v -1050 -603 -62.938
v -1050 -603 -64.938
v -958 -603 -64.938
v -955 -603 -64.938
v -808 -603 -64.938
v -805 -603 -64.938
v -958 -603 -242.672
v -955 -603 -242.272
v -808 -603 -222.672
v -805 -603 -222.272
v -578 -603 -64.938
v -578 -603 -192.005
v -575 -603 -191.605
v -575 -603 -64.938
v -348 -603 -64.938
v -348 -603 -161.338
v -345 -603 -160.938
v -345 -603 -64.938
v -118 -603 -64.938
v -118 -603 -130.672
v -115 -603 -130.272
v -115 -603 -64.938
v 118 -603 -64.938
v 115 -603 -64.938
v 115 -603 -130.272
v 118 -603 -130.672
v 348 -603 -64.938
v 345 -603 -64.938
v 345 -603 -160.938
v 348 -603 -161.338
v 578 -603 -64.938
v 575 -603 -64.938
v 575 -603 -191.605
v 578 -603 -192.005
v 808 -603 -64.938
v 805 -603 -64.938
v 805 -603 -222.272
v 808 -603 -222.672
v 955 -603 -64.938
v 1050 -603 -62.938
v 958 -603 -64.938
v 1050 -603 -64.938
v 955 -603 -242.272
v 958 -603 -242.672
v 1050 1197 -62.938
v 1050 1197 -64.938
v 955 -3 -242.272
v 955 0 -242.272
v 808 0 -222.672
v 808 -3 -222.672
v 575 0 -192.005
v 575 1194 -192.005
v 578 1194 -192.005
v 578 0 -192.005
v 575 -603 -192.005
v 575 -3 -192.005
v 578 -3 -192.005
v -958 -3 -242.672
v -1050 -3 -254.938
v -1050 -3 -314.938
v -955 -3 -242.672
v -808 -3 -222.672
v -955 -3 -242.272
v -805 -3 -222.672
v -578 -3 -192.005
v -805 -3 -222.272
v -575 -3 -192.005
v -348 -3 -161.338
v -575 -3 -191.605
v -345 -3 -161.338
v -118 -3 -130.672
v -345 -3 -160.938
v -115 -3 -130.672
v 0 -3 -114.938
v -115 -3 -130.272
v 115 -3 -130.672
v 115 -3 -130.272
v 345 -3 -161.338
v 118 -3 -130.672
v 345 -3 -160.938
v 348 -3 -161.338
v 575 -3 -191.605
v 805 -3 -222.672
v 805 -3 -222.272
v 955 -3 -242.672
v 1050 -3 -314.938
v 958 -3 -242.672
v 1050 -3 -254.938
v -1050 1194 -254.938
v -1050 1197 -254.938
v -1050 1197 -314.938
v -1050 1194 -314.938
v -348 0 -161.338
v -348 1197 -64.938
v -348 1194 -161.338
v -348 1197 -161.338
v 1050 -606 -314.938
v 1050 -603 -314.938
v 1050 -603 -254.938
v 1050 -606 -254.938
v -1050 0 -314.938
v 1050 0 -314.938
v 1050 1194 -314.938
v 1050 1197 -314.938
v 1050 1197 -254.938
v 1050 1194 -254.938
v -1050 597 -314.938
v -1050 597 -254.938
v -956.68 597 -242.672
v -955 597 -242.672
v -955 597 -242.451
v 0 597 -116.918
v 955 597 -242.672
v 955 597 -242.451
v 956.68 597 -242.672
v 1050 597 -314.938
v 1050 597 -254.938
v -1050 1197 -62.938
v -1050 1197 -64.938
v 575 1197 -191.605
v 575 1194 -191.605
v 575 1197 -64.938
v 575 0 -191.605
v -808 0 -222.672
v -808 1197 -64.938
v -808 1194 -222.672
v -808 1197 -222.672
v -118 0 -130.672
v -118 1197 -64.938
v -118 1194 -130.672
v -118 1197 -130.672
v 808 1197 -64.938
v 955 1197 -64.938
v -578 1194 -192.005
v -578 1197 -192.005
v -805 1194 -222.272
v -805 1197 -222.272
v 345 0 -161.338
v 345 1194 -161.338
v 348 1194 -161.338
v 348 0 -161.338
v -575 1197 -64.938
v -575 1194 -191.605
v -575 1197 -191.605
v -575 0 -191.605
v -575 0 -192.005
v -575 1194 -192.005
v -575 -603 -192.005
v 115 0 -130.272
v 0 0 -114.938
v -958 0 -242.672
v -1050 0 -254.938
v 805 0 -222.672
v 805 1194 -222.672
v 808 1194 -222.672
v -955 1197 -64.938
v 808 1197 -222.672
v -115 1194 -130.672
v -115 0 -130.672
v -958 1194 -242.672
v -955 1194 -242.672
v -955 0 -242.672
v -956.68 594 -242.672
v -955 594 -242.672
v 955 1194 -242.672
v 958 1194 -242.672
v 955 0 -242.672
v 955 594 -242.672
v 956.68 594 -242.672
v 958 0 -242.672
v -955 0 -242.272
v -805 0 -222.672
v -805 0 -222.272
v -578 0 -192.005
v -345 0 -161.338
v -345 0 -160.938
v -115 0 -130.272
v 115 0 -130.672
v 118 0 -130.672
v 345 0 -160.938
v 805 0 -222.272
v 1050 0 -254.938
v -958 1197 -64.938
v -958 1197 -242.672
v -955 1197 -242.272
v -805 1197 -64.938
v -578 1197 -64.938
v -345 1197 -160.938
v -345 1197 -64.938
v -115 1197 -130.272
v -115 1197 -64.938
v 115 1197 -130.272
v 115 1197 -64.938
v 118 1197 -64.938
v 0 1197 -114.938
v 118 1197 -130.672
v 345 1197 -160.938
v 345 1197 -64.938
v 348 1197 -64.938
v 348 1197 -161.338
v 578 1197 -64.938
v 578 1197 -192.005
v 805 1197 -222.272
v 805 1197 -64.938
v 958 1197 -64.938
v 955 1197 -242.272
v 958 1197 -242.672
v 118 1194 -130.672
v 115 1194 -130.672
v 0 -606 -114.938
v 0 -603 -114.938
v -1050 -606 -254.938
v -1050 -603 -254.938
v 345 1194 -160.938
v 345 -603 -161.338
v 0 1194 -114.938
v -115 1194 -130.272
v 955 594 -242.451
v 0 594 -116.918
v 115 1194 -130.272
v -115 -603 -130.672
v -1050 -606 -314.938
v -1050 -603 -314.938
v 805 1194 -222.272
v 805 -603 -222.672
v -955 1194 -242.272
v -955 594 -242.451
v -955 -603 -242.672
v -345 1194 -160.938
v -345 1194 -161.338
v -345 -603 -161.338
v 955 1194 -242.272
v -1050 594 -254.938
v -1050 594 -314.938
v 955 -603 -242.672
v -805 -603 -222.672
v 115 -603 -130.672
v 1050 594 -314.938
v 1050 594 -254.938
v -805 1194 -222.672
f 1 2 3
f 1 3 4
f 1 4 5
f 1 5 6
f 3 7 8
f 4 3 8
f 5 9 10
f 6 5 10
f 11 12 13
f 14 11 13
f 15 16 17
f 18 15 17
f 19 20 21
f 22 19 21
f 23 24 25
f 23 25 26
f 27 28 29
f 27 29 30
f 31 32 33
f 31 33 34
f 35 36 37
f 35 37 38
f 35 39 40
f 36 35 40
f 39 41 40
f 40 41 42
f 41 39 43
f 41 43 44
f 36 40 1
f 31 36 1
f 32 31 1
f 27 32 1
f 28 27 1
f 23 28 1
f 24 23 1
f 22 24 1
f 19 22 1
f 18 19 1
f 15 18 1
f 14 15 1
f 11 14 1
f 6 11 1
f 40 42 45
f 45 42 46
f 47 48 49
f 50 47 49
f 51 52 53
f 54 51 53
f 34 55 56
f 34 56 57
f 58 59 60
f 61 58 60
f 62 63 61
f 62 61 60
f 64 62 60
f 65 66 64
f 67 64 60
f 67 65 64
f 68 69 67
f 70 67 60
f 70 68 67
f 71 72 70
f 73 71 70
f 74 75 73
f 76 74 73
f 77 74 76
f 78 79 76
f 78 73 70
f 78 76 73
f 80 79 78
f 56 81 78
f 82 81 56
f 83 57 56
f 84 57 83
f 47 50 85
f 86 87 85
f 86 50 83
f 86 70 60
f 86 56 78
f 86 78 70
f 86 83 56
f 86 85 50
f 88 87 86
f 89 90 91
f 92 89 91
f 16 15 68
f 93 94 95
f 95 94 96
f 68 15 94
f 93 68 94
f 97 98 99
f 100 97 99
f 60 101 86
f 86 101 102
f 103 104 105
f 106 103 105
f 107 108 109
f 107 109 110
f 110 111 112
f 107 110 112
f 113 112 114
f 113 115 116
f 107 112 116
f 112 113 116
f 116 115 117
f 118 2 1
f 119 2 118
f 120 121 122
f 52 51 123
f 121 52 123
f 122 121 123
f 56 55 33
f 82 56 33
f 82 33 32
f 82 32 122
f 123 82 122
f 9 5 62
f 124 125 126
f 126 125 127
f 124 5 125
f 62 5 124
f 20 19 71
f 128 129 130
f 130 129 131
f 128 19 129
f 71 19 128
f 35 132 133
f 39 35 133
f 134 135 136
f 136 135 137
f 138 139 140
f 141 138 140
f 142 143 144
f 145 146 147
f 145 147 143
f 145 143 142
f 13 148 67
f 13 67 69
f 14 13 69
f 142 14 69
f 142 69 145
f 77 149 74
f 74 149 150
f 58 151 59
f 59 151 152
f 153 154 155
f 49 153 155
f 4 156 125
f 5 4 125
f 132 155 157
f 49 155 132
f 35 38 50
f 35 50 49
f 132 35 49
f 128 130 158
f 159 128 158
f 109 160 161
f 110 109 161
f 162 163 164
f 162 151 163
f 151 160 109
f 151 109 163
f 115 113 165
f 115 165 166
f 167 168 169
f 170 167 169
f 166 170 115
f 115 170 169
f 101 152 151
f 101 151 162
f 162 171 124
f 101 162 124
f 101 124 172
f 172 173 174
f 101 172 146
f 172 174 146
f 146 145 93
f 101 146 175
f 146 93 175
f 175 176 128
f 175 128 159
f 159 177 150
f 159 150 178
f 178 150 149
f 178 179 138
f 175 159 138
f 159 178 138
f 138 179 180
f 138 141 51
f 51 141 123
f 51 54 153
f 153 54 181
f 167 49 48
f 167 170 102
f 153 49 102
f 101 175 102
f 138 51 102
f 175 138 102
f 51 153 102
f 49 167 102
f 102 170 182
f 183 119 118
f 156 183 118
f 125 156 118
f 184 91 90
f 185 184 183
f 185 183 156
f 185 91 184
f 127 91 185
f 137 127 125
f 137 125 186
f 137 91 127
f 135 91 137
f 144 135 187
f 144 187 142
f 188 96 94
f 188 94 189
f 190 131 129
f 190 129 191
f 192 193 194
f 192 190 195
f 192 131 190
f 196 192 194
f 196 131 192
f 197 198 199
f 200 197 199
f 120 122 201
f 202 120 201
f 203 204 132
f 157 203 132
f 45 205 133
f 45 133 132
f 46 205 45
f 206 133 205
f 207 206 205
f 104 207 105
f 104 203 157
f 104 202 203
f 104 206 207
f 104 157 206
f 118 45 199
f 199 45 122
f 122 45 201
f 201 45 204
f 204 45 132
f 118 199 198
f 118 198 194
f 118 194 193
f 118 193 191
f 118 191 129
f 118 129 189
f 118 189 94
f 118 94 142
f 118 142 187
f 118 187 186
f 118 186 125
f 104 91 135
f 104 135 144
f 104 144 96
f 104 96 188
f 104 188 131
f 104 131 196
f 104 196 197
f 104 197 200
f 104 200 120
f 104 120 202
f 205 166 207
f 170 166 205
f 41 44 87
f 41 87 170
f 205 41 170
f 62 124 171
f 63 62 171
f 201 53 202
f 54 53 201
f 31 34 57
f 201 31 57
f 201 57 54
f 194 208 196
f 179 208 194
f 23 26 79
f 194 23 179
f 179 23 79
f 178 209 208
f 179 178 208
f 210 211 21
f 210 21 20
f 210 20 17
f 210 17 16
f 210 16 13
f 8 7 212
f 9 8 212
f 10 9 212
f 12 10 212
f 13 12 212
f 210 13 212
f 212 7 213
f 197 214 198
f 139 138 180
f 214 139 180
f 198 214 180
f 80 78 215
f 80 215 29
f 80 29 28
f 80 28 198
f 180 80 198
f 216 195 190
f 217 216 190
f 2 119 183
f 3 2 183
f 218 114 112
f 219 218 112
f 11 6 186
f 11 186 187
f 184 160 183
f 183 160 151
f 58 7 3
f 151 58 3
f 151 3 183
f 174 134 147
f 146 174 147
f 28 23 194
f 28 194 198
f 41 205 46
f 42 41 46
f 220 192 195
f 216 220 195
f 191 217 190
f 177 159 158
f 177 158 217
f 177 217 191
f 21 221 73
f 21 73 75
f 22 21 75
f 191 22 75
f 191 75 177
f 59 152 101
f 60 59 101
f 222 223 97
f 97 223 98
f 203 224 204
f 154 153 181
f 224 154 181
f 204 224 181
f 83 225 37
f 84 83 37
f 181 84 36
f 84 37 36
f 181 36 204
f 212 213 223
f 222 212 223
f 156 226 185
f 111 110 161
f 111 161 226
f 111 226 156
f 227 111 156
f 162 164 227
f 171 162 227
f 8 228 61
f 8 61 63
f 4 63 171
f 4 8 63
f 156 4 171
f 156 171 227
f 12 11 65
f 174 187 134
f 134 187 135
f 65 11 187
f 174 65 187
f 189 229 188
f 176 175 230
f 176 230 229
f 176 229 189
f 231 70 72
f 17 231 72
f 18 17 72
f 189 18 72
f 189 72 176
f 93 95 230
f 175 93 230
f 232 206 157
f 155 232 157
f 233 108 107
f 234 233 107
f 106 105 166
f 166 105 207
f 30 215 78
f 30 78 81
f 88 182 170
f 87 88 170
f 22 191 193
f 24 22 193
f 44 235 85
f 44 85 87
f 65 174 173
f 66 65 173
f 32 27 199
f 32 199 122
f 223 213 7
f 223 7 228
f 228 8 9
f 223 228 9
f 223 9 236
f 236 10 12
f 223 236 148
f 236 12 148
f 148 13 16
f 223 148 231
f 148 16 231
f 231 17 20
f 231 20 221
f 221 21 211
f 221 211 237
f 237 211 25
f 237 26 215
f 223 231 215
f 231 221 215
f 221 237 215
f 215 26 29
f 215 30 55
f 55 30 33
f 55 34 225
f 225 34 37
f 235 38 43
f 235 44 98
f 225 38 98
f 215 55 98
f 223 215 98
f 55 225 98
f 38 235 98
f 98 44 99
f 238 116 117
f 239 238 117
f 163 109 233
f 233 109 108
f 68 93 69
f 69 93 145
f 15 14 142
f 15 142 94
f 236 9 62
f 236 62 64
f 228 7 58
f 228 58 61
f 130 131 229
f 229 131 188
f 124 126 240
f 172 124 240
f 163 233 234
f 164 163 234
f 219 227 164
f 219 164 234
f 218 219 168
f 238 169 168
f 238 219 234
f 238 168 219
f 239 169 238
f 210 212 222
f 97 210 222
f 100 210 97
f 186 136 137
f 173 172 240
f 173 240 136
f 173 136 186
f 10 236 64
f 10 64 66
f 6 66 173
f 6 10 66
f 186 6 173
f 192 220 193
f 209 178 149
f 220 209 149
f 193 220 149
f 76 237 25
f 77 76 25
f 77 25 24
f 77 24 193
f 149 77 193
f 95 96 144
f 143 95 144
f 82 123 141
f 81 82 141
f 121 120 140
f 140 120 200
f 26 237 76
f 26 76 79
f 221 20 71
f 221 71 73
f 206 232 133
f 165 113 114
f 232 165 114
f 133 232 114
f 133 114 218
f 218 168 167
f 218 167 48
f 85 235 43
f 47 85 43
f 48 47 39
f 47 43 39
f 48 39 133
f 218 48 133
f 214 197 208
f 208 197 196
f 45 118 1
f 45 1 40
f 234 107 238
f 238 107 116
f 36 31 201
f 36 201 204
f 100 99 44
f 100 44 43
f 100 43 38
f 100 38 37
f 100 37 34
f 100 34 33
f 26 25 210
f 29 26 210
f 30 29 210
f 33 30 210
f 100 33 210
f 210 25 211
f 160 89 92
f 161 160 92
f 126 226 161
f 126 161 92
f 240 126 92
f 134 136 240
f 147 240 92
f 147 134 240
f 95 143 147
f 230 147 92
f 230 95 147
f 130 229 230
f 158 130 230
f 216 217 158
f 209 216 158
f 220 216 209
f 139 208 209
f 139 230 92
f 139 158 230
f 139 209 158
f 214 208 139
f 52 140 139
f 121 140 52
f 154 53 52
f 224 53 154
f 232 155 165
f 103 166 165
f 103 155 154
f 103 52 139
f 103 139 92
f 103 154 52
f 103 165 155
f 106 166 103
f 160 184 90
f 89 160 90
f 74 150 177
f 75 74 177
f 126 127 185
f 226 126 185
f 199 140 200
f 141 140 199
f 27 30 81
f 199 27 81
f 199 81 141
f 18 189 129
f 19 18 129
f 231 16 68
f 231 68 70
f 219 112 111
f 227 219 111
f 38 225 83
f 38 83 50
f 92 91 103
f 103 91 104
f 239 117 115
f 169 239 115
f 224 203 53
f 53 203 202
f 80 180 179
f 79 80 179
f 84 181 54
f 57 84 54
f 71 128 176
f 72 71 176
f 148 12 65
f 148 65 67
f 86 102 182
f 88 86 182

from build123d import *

# Parameters (mm, degrees)
F1_DEPTH  = 3
F3_W      = 3
F3_H      = 177.7333333333
F3_H_2    = 157.7333333333
F3_H_3    = 127.0666666667
F3_H_4    = 96.4
F3_H_5    = 65.7333333333
F4_DEPTH  = 1800
F7_DEPTH  = 3
F10_DEPTH = 3
F11_W     = 2100
F11_H     = 1800
F12_DEPTH = 2
F14_DEPTH = 3


with BuildPart() as f1:
    # F0 (on Front) → F1 (new body)
    with BuildSketch(Plane.XZ):
        Polygon((-1050, -314.938241453), (0, -314.938241453), (1050, -314.938241453), (1050, -254.938241453), (958, -242.6715747864), (955, -242.2715747864), (808, -222.6715747864), (805, -222.2715747864), (578, -192.0049081197), (575, -191.6049081197), (348, -161.338241453), (345, -160.938241453), (118, -130.6715747864), (115, -130.2715747864), (0, -114.938241453), (-115, -130.2715747864), (-118, -130.6715747864), (-345, -160.938241453), (-348, -161.338241453), (-575, -191.6049081197), (-578, -192.0049081197), (-805, -222.2715747864), (-808, -222.6715747864), (-955, -242.2715747864), (-958, -242.6715747864), (-1050, -254.938241453), align=None)
        Polygon((-958, -64.938241453), (-958, -242.6715747864), (-955, -242.2715747864), (-955, -64.938241453), align=None)
        Polygon((955, -242.2715747864), (958, -242.6715747864), (958, -64.938241453), (955, -64.938241453), align=None)
        Polygon((-808, -64.938241453), (-808, -222.6715747864), (-805, -222.2715747864), (-805, -64.938241453), align=None)
        Polygon((805, -222.2715747864), (808, -222.6715747864), (808, -64.938241453), (805, -64.938241453), align=None)
        Polygon((-578, -64.938241453), (-578, -192.0049081197), (-575, -191.6049081197), (-575, -64.938241453), align=None)
        Polygon((575, -191.6049081197), (578, -192.0049081197), (578, -64.938241453), (575, -64.938241453), align=None)
        Polygon((-348, -64.938241453), (-348, -161.338241453), (-345, -160.938241453), (-345, -64.938241453), align=None)
        Polygon((345, -160.938241453), (348, -161.338241453), (348, -64.938241453), (345, -64.938241453), align=None)
        Polygon((-118, -64.938241453), (-118, -130.6715747864), (-115, -130.2715747864), (-115, -64.938241453), align=None)
        Polygon((115, -130.2715747864), (118, -130.6715747864), (118, -64.938241453), (115, -64.938241453), align=None)
    extrude(amount=F1_DEPTH)

    # F3 (on offset) → F4 (join)
    with BuildSketch(Plane.XZ.offset(603)):
        with Locations((-956.5, -153.8049081197)):
            Rectangle(F3_W, F3_H)
        with Locations((-806.5, -143.8049081197)):
            Rectangle(F3_W, F3_H_2)
        with Locations((-576.5, -128.4715747864)):
            Rectangle(F3_W, F3_H_3)
        with Locations((-346.5, -113.138241453)):
            Rectangle(F3_W, F3_H_4)
        with Locations((-116.5, -97.8049081197)):
            Rectangle(F3_W, F3_H_5)
        with Locations((346.5, -113.138241453)):
            Rectangle(F3_W, F3_H_4)
        with Locations((576.5, -128.4715747864)):
            Rectangle(F3_W, F3_H_3)
        with Locations((806.5, -143.8049081197)):
            Rectangle(F3_W, F3_H_2)
        with Locations((116.5, -97.8049081197)):
            Rectangle(F3_W, F3_H_5)
        with Locations((956.5, -153.8049081197)):
            Rectangle(F3_W, F3_H)
    extrude(amount=-F4_DEPTH)

    # F6 (on offset) → F7 (join)
    with BuildSketch(Plane.XZ.offset(-597)):
        Polygon((1050, -254.938241453), (0, -116.9179081917), (-1050, -254.938241453), (-1050, -314.938241453), (0, -314.938241453), (1050, -314.938241453), align=None)
    extrude(amount=F7_DEPTH)

    # F9 (on offset) → F10 (join)
    with BuildSketch(Plane.XZ.offset(-1197)):
        Polygon((1050, -254.938241453), (0, -114.938241453), (-1050, -254.938241453), (-1050, -314.938241453), (0, -314.938241453), (1050, -314.938241453), align=None)
    extrude(amount=F10_DEPTH)

    # F11 (on face) → F12 (join)
    with BuildSketch(Plane.XY.offset(-64.938241453)):
        with Locations((0, 297)):
            Rectangle(F11_W, F11_H)
    extrude(amount=F12_DEPTH)

    # F13 (on offset) → F14 (join)
    with BuildSketch(Plane.XZ.offset(603)):
        Polygon((1050, -254.938241453), (0, -114.938241453), (-1050, -254.938241453), (-1050, -314.938241453), (0, -314.938241453), (1050, -314.938241453), align=None)
    extrude(amount=F14_DEPTH)


solid = f1.part
